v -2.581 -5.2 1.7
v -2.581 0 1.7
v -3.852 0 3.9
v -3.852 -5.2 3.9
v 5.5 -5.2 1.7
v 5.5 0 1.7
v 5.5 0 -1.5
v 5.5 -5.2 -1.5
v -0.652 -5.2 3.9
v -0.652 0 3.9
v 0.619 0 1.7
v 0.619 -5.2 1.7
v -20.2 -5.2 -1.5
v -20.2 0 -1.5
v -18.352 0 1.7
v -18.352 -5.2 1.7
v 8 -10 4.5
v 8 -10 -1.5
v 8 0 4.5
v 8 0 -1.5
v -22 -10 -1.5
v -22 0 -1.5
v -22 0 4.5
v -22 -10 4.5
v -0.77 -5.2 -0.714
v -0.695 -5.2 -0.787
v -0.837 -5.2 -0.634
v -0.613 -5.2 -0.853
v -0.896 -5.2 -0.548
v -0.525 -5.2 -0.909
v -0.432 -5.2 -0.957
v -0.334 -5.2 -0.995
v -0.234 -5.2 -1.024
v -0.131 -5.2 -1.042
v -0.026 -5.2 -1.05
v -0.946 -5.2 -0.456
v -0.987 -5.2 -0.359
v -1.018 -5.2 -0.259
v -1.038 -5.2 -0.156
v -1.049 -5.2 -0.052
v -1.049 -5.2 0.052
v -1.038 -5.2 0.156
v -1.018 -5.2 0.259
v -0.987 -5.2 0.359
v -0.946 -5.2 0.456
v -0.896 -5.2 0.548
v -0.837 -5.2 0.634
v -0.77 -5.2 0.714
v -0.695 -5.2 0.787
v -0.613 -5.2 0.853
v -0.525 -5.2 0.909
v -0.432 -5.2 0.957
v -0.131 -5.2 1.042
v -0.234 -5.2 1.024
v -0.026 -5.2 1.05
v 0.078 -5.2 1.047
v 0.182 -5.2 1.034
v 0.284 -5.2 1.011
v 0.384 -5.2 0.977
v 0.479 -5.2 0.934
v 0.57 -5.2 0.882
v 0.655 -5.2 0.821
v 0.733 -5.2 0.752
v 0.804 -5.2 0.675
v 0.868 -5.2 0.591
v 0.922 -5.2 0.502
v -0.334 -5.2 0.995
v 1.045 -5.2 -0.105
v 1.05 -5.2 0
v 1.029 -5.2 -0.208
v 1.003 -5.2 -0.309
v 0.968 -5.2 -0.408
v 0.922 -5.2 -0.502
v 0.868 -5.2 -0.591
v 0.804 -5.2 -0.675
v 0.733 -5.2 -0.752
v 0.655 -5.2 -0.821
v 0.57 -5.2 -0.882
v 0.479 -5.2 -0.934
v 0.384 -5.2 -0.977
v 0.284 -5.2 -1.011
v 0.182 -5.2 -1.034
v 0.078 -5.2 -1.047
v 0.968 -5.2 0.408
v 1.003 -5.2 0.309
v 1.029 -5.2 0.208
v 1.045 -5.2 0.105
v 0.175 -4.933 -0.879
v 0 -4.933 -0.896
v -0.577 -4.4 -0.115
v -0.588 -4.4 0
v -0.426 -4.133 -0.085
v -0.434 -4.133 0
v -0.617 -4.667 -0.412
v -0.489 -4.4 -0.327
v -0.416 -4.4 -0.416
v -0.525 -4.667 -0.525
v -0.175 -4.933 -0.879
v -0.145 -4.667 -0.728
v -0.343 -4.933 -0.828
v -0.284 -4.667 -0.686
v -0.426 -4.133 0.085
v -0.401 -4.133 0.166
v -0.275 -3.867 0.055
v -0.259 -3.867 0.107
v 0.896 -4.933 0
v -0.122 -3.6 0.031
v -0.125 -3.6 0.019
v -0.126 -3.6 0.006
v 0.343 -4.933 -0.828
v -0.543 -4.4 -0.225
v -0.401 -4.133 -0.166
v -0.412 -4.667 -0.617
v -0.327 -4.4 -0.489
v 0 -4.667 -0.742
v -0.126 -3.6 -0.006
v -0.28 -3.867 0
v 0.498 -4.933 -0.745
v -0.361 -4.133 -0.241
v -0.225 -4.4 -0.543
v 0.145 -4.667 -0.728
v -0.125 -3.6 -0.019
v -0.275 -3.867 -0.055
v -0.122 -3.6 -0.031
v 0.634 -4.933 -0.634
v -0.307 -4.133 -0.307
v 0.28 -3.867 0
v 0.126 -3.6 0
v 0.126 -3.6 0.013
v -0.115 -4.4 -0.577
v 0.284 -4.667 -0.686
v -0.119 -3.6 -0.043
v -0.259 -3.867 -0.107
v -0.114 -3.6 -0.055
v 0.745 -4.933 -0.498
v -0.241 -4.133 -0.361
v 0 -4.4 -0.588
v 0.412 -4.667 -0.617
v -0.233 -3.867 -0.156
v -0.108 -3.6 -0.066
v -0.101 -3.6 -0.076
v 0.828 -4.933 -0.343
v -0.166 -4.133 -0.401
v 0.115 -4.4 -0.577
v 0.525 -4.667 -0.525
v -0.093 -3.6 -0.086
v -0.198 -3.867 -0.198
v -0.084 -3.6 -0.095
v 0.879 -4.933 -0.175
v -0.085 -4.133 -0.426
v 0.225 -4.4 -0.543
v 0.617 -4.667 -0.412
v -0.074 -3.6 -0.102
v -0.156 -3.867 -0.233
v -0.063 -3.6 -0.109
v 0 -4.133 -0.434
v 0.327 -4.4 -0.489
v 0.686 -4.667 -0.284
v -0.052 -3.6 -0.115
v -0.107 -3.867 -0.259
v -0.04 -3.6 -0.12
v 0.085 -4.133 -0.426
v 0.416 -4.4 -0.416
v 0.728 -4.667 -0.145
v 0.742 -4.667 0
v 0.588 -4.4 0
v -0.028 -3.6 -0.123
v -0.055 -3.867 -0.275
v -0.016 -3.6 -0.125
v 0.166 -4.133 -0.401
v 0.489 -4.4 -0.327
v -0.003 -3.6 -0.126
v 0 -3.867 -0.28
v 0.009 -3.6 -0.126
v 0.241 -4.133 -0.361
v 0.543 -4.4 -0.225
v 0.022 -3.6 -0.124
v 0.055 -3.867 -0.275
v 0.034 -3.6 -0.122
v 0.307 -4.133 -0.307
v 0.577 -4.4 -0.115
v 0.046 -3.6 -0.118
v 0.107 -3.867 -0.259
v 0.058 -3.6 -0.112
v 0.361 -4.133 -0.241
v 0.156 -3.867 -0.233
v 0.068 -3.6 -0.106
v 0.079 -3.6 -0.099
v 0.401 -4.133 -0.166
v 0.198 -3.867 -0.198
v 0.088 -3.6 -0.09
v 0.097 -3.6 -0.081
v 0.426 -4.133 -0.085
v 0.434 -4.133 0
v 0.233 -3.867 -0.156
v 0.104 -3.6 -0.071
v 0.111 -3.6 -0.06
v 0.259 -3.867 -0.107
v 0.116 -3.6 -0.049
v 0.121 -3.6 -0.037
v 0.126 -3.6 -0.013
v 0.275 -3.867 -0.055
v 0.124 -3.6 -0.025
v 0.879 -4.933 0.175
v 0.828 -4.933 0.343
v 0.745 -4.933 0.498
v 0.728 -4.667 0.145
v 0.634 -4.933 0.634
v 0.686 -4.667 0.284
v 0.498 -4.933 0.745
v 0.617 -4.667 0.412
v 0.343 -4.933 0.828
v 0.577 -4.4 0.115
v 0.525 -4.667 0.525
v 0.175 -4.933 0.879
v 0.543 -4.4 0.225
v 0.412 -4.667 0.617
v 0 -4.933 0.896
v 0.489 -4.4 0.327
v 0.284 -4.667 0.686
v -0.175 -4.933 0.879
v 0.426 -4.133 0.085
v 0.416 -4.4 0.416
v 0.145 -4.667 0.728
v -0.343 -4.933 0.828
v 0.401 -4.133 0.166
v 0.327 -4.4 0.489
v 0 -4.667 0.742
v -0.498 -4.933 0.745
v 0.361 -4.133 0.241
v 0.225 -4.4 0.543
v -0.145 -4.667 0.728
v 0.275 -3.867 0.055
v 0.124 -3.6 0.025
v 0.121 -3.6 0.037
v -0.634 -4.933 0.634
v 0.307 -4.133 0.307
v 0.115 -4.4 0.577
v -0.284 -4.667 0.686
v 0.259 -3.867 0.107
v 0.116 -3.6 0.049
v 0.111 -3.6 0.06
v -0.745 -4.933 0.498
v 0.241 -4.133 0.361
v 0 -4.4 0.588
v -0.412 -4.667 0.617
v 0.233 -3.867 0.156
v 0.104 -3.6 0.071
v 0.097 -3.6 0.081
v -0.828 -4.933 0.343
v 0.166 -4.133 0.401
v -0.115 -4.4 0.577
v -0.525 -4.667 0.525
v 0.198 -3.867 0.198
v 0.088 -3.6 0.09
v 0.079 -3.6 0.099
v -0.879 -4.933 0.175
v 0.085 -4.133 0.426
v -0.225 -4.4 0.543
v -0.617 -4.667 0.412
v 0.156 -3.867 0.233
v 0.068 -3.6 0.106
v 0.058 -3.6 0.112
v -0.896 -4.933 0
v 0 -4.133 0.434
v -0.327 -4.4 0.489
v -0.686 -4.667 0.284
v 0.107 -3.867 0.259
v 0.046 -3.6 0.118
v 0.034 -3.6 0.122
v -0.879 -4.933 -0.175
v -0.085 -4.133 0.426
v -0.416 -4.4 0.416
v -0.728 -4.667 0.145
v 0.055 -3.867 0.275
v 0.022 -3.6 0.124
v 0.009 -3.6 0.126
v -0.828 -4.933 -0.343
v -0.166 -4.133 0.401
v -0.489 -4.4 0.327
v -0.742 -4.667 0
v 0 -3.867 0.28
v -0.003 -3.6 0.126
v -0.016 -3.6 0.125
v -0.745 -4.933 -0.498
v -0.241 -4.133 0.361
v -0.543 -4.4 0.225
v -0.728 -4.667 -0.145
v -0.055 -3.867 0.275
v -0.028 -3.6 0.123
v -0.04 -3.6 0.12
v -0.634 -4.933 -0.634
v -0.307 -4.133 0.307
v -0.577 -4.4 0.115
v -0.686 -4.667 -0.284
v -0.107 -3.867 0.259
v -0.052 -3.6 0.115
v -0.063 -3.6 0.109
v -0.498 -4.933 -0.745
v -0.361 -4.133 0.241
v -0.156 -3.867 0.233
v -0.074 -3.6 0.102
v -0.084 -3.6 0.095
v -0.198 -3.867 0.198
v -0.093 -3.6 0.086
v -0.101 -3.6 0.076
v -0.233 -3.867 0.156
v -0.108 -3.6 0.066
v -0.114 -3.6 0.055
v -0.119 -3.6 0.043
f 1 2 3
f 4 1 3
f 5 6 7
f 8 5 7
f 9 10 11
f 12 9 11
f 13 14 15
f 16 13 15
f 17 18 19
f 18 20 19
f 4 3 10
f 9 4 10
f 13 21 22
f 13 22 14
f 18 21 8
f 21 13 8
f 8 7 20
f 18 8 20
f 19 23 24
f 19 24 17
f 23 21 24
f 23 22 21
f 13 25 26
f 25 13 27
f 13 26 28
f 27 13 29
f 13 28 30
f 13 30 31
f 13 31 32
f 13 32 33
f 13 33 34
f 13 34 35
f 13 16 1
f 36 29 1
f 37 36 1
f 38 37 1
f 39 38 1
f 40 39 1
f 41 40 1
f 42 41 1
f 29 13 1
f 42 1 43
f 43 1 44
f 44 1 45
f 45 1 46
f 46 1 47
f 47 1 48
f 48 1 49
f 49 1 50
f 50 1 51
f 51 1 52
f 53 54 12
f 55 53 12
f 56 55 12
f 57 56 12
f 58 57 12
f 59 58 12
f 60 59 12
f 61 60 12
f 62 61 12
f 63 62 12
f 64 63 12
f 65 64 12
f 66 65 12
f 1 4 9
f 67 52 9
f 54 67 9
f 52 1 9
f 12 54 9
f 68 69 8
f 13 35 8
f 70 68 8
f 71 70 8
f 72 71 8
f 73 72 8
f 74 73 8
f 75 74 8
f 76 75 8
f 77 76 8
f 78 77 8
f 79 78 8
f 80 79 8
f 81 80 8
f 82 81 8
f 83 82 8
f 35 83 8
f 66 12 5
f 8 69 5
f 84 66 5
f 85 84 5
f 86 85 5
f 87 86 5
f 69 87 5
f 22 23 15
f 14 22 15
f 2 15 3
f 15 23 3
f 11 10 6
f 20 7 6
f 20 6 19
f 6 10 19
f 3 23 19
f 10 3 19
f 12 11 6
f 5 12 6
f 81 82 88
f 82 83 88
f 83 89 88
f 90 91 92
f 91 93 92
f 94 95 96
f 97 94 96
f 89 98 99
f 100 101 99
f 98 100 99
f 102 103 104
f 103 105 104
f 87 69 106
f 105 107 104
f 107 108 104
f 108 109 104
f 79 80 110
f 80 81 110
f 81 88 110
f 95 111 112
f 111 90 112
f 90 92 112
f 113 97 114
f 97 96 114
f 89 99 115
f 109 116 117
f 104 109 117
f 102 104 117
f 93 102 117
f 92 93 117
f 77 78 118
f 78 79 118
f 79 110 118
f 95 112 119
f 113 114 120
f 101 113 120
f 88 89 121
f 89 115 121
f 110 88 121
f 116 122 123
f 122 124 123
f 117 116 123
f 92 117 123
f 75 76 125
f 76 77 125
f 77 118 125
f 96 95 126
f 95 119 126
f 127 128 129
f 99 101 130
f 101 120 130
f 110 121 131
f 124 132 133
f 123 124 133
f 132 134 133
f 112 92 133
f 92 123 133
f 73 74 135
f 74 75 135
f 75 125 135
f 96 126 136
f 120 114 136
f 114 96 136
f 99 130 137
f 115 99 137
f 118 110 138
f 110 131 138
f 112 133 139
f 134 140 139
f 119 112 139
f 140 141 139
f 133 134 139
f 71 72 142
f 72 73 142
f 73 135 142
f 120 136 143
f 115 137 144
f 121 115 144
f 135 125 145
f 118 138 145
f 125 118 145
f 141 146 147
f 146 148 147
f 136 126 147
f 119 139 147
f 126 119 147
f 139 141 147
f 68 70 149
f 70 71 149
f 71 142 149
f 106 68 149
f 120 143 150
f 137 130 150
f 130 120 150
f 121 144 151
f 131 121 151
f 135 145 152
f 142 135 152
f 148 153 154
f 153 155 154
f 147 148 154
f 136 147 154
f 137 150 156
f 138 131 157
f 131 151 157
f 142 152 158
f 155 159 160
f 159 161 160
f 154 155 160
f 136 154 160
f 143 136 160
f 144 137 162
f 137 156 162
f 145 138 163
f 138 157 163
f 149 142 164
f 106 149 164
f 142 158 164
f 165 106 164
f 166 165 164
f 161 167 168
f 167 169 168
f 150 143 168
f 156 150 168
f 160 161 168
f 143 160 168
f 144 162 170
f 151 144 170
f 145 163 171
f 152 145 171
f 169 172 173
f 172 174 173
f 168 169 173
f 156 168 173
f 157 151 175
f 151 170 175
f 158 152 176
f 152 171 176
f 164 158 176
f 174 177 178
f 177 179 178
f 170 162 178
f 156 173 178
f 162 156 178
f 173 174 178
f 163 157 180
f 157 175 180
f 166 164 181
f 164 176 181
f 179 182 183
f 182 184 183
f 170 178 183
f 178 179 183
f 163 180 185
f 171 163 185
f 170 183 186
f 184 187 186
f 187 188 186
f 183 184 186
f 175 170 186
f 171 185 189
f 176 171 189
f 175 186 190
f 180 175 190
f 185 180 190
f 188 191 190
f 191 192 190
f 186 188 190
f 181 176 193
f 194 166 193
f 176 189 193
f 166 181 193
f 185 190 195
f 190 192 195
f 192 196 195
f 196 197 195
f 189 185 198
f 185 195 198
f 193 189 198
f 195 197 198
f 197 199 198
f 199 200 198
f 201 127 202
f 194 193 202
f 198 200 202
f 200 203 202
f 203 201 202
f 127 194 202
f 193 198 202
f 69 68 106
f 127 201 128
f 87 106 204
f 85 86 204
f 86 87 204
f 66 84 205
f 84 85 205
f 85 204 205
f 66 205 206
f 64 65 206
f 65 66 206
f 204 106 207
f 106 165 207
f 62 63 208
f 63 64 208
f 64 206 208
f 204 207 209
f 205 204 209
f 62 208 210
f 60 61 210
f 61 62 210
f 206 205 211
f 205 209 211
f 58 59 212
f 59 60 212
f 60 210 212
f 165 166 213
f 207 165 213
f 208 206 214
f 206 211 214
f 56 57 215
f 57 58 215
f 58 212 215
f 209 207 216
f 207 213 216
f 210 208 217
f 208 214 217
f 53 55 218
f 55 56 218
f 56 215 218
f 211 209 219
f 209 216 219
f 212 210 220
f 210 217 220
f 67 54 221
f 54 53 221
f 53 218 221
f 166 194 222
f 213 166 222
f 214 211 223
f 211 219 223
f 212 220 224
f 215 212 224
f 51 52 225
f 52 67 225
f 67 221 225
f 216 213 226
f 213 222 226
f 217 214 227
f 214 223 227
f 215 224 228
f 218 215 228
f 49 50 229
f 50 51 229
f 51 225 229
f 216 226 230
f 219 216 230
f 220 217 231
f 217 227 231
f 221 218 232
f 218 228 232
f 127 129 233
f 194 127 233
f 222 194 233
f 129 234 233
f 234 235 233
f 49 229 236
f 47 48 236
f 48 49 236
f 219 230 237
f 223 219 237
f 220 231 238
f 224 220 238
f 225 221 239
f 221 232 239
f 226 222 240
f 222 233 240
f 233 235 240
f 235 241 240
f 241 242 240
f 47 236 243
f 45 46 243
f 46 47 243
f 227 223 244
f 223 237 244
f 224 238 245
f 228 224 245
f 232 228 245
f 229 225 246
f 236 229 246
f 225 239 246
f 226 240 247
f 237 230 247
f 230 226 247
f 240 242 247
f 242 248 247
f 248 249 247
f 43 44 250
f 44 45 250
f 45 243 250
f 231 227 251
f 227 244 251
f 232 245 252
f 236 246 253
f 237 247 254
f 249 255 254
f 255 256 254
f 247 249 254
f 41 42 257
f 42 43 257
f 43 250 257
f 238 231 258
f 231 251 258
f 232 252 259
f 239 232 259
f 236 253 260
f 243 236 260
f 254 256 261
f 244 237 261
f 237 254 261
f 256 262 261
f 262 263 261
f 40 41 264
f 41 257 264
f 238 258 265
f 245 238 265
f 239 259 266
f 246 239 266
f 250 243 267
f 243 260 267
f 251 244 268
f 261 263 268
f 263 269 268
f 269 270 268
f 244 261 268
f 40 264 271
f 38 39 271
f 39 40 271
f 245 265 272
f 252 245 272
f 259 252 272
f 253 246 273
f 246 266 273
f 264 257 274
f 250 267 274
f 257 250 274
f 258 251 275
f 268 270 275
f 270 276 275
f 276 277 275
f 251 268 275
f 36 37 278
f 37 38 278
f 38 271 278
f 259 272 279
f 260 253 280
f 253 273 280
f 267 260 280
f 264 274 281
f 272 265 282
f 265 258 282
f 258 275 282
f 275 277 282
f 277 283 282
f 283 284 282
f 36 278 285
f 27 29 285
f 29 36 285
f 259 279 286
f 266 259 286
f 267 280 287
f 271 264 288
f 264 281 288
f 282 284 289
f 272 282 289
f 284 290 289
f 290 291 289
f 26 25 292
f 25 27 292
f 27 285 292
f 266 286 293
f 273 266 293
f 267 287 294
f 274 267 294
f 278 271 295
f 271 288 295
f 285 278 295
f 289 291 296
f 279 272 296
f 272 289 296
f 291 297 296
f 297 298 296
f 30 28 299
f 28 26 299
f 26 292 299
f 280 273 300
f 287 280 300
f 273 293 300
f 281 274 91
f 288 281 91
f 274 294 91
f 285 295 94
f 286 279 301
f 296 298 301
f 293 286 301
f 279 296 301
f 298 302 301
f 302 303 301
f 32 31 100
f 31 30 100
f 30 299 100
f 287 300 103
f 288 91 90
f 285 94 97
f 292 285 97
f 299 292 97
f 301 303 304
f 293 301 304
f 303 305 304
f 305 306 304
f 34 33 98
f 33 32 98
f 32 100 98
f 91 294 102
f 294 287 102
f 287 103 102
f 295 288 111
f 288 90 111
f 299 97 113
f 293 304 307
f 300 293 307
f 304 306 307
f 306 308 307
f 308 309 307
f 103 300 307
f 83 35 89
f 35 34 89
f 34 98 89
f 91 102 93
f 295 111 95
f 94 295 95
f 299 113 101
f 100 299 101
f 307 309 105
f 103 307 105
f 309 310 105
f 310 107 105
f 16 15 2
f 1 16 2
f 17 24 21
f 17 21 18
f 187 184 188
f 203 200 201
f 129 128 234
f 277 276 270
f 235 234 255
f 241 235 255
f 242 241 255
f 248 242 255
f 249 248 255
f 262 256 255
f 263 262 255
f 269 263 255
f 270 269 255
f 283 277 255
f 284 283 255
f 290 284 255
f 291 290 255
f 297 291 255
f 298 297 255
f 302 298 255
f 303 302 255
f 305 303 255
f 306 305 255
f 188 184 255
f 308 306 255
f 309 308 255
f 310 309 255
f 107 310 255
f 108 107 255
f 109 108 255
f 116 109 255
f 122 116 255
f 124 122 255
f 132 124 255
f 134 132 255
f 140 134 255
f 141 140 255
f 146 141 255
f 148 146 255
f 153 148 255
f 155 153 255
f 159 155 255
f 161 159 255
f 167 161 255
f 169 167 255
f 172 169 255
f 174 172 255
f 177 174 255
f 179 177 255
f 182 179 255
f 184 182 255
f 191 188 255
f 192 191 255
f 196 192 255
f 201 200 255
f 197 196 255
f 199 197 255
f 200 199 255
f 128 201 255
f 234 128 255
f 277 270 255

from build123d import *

# Parameters (mm, degrees)
PAD002_DEPTH = 5.2
SKETCH006_R  = 1.05
PAD003_DEPTH = 1.6
PAD003_TAPER = 30
SKETCH007_W  = 30
SKETCH007_H  = 6
PAD004_DEPTH = 4.8


with BuildPart() as part:
    # Sketch005 → Pad002 (new body)
    with BuildSketch(Plane.XZ):
        Polygon((-20.2, -1.5), (-18.352479, 1.7), (-2.581495, 1.7), (-3.851666, 3.9), (-0.651666, 3.9), (0.618505, 1.7), (5.5, 1.7), (5.5, -1.5), (8, -1.5), (8, 4.5), (-22, 4.5), (-22, -1.5), align=None)
    extrude(amount=PAD002_DEPTH)

    # Sketch006 → Pad003 (join)
    with BuildSketch(Plane.XZ.offset(5.2)):
        Circle(SKETCH006_R)
    extrude(amount=-PAD003_DEPTH, taper=PAD003_TAPER)

    # Sketch007 → Pad004 (join)
    with BuildSketch(Plane.XZ.offset(5.2)):
        with Locations((-7, 1.5)):
            Rectangle(SKETCH007_W, SKETCH007_H)
    extrude(amount=PAD004_DEPTH)


solid = part.part
